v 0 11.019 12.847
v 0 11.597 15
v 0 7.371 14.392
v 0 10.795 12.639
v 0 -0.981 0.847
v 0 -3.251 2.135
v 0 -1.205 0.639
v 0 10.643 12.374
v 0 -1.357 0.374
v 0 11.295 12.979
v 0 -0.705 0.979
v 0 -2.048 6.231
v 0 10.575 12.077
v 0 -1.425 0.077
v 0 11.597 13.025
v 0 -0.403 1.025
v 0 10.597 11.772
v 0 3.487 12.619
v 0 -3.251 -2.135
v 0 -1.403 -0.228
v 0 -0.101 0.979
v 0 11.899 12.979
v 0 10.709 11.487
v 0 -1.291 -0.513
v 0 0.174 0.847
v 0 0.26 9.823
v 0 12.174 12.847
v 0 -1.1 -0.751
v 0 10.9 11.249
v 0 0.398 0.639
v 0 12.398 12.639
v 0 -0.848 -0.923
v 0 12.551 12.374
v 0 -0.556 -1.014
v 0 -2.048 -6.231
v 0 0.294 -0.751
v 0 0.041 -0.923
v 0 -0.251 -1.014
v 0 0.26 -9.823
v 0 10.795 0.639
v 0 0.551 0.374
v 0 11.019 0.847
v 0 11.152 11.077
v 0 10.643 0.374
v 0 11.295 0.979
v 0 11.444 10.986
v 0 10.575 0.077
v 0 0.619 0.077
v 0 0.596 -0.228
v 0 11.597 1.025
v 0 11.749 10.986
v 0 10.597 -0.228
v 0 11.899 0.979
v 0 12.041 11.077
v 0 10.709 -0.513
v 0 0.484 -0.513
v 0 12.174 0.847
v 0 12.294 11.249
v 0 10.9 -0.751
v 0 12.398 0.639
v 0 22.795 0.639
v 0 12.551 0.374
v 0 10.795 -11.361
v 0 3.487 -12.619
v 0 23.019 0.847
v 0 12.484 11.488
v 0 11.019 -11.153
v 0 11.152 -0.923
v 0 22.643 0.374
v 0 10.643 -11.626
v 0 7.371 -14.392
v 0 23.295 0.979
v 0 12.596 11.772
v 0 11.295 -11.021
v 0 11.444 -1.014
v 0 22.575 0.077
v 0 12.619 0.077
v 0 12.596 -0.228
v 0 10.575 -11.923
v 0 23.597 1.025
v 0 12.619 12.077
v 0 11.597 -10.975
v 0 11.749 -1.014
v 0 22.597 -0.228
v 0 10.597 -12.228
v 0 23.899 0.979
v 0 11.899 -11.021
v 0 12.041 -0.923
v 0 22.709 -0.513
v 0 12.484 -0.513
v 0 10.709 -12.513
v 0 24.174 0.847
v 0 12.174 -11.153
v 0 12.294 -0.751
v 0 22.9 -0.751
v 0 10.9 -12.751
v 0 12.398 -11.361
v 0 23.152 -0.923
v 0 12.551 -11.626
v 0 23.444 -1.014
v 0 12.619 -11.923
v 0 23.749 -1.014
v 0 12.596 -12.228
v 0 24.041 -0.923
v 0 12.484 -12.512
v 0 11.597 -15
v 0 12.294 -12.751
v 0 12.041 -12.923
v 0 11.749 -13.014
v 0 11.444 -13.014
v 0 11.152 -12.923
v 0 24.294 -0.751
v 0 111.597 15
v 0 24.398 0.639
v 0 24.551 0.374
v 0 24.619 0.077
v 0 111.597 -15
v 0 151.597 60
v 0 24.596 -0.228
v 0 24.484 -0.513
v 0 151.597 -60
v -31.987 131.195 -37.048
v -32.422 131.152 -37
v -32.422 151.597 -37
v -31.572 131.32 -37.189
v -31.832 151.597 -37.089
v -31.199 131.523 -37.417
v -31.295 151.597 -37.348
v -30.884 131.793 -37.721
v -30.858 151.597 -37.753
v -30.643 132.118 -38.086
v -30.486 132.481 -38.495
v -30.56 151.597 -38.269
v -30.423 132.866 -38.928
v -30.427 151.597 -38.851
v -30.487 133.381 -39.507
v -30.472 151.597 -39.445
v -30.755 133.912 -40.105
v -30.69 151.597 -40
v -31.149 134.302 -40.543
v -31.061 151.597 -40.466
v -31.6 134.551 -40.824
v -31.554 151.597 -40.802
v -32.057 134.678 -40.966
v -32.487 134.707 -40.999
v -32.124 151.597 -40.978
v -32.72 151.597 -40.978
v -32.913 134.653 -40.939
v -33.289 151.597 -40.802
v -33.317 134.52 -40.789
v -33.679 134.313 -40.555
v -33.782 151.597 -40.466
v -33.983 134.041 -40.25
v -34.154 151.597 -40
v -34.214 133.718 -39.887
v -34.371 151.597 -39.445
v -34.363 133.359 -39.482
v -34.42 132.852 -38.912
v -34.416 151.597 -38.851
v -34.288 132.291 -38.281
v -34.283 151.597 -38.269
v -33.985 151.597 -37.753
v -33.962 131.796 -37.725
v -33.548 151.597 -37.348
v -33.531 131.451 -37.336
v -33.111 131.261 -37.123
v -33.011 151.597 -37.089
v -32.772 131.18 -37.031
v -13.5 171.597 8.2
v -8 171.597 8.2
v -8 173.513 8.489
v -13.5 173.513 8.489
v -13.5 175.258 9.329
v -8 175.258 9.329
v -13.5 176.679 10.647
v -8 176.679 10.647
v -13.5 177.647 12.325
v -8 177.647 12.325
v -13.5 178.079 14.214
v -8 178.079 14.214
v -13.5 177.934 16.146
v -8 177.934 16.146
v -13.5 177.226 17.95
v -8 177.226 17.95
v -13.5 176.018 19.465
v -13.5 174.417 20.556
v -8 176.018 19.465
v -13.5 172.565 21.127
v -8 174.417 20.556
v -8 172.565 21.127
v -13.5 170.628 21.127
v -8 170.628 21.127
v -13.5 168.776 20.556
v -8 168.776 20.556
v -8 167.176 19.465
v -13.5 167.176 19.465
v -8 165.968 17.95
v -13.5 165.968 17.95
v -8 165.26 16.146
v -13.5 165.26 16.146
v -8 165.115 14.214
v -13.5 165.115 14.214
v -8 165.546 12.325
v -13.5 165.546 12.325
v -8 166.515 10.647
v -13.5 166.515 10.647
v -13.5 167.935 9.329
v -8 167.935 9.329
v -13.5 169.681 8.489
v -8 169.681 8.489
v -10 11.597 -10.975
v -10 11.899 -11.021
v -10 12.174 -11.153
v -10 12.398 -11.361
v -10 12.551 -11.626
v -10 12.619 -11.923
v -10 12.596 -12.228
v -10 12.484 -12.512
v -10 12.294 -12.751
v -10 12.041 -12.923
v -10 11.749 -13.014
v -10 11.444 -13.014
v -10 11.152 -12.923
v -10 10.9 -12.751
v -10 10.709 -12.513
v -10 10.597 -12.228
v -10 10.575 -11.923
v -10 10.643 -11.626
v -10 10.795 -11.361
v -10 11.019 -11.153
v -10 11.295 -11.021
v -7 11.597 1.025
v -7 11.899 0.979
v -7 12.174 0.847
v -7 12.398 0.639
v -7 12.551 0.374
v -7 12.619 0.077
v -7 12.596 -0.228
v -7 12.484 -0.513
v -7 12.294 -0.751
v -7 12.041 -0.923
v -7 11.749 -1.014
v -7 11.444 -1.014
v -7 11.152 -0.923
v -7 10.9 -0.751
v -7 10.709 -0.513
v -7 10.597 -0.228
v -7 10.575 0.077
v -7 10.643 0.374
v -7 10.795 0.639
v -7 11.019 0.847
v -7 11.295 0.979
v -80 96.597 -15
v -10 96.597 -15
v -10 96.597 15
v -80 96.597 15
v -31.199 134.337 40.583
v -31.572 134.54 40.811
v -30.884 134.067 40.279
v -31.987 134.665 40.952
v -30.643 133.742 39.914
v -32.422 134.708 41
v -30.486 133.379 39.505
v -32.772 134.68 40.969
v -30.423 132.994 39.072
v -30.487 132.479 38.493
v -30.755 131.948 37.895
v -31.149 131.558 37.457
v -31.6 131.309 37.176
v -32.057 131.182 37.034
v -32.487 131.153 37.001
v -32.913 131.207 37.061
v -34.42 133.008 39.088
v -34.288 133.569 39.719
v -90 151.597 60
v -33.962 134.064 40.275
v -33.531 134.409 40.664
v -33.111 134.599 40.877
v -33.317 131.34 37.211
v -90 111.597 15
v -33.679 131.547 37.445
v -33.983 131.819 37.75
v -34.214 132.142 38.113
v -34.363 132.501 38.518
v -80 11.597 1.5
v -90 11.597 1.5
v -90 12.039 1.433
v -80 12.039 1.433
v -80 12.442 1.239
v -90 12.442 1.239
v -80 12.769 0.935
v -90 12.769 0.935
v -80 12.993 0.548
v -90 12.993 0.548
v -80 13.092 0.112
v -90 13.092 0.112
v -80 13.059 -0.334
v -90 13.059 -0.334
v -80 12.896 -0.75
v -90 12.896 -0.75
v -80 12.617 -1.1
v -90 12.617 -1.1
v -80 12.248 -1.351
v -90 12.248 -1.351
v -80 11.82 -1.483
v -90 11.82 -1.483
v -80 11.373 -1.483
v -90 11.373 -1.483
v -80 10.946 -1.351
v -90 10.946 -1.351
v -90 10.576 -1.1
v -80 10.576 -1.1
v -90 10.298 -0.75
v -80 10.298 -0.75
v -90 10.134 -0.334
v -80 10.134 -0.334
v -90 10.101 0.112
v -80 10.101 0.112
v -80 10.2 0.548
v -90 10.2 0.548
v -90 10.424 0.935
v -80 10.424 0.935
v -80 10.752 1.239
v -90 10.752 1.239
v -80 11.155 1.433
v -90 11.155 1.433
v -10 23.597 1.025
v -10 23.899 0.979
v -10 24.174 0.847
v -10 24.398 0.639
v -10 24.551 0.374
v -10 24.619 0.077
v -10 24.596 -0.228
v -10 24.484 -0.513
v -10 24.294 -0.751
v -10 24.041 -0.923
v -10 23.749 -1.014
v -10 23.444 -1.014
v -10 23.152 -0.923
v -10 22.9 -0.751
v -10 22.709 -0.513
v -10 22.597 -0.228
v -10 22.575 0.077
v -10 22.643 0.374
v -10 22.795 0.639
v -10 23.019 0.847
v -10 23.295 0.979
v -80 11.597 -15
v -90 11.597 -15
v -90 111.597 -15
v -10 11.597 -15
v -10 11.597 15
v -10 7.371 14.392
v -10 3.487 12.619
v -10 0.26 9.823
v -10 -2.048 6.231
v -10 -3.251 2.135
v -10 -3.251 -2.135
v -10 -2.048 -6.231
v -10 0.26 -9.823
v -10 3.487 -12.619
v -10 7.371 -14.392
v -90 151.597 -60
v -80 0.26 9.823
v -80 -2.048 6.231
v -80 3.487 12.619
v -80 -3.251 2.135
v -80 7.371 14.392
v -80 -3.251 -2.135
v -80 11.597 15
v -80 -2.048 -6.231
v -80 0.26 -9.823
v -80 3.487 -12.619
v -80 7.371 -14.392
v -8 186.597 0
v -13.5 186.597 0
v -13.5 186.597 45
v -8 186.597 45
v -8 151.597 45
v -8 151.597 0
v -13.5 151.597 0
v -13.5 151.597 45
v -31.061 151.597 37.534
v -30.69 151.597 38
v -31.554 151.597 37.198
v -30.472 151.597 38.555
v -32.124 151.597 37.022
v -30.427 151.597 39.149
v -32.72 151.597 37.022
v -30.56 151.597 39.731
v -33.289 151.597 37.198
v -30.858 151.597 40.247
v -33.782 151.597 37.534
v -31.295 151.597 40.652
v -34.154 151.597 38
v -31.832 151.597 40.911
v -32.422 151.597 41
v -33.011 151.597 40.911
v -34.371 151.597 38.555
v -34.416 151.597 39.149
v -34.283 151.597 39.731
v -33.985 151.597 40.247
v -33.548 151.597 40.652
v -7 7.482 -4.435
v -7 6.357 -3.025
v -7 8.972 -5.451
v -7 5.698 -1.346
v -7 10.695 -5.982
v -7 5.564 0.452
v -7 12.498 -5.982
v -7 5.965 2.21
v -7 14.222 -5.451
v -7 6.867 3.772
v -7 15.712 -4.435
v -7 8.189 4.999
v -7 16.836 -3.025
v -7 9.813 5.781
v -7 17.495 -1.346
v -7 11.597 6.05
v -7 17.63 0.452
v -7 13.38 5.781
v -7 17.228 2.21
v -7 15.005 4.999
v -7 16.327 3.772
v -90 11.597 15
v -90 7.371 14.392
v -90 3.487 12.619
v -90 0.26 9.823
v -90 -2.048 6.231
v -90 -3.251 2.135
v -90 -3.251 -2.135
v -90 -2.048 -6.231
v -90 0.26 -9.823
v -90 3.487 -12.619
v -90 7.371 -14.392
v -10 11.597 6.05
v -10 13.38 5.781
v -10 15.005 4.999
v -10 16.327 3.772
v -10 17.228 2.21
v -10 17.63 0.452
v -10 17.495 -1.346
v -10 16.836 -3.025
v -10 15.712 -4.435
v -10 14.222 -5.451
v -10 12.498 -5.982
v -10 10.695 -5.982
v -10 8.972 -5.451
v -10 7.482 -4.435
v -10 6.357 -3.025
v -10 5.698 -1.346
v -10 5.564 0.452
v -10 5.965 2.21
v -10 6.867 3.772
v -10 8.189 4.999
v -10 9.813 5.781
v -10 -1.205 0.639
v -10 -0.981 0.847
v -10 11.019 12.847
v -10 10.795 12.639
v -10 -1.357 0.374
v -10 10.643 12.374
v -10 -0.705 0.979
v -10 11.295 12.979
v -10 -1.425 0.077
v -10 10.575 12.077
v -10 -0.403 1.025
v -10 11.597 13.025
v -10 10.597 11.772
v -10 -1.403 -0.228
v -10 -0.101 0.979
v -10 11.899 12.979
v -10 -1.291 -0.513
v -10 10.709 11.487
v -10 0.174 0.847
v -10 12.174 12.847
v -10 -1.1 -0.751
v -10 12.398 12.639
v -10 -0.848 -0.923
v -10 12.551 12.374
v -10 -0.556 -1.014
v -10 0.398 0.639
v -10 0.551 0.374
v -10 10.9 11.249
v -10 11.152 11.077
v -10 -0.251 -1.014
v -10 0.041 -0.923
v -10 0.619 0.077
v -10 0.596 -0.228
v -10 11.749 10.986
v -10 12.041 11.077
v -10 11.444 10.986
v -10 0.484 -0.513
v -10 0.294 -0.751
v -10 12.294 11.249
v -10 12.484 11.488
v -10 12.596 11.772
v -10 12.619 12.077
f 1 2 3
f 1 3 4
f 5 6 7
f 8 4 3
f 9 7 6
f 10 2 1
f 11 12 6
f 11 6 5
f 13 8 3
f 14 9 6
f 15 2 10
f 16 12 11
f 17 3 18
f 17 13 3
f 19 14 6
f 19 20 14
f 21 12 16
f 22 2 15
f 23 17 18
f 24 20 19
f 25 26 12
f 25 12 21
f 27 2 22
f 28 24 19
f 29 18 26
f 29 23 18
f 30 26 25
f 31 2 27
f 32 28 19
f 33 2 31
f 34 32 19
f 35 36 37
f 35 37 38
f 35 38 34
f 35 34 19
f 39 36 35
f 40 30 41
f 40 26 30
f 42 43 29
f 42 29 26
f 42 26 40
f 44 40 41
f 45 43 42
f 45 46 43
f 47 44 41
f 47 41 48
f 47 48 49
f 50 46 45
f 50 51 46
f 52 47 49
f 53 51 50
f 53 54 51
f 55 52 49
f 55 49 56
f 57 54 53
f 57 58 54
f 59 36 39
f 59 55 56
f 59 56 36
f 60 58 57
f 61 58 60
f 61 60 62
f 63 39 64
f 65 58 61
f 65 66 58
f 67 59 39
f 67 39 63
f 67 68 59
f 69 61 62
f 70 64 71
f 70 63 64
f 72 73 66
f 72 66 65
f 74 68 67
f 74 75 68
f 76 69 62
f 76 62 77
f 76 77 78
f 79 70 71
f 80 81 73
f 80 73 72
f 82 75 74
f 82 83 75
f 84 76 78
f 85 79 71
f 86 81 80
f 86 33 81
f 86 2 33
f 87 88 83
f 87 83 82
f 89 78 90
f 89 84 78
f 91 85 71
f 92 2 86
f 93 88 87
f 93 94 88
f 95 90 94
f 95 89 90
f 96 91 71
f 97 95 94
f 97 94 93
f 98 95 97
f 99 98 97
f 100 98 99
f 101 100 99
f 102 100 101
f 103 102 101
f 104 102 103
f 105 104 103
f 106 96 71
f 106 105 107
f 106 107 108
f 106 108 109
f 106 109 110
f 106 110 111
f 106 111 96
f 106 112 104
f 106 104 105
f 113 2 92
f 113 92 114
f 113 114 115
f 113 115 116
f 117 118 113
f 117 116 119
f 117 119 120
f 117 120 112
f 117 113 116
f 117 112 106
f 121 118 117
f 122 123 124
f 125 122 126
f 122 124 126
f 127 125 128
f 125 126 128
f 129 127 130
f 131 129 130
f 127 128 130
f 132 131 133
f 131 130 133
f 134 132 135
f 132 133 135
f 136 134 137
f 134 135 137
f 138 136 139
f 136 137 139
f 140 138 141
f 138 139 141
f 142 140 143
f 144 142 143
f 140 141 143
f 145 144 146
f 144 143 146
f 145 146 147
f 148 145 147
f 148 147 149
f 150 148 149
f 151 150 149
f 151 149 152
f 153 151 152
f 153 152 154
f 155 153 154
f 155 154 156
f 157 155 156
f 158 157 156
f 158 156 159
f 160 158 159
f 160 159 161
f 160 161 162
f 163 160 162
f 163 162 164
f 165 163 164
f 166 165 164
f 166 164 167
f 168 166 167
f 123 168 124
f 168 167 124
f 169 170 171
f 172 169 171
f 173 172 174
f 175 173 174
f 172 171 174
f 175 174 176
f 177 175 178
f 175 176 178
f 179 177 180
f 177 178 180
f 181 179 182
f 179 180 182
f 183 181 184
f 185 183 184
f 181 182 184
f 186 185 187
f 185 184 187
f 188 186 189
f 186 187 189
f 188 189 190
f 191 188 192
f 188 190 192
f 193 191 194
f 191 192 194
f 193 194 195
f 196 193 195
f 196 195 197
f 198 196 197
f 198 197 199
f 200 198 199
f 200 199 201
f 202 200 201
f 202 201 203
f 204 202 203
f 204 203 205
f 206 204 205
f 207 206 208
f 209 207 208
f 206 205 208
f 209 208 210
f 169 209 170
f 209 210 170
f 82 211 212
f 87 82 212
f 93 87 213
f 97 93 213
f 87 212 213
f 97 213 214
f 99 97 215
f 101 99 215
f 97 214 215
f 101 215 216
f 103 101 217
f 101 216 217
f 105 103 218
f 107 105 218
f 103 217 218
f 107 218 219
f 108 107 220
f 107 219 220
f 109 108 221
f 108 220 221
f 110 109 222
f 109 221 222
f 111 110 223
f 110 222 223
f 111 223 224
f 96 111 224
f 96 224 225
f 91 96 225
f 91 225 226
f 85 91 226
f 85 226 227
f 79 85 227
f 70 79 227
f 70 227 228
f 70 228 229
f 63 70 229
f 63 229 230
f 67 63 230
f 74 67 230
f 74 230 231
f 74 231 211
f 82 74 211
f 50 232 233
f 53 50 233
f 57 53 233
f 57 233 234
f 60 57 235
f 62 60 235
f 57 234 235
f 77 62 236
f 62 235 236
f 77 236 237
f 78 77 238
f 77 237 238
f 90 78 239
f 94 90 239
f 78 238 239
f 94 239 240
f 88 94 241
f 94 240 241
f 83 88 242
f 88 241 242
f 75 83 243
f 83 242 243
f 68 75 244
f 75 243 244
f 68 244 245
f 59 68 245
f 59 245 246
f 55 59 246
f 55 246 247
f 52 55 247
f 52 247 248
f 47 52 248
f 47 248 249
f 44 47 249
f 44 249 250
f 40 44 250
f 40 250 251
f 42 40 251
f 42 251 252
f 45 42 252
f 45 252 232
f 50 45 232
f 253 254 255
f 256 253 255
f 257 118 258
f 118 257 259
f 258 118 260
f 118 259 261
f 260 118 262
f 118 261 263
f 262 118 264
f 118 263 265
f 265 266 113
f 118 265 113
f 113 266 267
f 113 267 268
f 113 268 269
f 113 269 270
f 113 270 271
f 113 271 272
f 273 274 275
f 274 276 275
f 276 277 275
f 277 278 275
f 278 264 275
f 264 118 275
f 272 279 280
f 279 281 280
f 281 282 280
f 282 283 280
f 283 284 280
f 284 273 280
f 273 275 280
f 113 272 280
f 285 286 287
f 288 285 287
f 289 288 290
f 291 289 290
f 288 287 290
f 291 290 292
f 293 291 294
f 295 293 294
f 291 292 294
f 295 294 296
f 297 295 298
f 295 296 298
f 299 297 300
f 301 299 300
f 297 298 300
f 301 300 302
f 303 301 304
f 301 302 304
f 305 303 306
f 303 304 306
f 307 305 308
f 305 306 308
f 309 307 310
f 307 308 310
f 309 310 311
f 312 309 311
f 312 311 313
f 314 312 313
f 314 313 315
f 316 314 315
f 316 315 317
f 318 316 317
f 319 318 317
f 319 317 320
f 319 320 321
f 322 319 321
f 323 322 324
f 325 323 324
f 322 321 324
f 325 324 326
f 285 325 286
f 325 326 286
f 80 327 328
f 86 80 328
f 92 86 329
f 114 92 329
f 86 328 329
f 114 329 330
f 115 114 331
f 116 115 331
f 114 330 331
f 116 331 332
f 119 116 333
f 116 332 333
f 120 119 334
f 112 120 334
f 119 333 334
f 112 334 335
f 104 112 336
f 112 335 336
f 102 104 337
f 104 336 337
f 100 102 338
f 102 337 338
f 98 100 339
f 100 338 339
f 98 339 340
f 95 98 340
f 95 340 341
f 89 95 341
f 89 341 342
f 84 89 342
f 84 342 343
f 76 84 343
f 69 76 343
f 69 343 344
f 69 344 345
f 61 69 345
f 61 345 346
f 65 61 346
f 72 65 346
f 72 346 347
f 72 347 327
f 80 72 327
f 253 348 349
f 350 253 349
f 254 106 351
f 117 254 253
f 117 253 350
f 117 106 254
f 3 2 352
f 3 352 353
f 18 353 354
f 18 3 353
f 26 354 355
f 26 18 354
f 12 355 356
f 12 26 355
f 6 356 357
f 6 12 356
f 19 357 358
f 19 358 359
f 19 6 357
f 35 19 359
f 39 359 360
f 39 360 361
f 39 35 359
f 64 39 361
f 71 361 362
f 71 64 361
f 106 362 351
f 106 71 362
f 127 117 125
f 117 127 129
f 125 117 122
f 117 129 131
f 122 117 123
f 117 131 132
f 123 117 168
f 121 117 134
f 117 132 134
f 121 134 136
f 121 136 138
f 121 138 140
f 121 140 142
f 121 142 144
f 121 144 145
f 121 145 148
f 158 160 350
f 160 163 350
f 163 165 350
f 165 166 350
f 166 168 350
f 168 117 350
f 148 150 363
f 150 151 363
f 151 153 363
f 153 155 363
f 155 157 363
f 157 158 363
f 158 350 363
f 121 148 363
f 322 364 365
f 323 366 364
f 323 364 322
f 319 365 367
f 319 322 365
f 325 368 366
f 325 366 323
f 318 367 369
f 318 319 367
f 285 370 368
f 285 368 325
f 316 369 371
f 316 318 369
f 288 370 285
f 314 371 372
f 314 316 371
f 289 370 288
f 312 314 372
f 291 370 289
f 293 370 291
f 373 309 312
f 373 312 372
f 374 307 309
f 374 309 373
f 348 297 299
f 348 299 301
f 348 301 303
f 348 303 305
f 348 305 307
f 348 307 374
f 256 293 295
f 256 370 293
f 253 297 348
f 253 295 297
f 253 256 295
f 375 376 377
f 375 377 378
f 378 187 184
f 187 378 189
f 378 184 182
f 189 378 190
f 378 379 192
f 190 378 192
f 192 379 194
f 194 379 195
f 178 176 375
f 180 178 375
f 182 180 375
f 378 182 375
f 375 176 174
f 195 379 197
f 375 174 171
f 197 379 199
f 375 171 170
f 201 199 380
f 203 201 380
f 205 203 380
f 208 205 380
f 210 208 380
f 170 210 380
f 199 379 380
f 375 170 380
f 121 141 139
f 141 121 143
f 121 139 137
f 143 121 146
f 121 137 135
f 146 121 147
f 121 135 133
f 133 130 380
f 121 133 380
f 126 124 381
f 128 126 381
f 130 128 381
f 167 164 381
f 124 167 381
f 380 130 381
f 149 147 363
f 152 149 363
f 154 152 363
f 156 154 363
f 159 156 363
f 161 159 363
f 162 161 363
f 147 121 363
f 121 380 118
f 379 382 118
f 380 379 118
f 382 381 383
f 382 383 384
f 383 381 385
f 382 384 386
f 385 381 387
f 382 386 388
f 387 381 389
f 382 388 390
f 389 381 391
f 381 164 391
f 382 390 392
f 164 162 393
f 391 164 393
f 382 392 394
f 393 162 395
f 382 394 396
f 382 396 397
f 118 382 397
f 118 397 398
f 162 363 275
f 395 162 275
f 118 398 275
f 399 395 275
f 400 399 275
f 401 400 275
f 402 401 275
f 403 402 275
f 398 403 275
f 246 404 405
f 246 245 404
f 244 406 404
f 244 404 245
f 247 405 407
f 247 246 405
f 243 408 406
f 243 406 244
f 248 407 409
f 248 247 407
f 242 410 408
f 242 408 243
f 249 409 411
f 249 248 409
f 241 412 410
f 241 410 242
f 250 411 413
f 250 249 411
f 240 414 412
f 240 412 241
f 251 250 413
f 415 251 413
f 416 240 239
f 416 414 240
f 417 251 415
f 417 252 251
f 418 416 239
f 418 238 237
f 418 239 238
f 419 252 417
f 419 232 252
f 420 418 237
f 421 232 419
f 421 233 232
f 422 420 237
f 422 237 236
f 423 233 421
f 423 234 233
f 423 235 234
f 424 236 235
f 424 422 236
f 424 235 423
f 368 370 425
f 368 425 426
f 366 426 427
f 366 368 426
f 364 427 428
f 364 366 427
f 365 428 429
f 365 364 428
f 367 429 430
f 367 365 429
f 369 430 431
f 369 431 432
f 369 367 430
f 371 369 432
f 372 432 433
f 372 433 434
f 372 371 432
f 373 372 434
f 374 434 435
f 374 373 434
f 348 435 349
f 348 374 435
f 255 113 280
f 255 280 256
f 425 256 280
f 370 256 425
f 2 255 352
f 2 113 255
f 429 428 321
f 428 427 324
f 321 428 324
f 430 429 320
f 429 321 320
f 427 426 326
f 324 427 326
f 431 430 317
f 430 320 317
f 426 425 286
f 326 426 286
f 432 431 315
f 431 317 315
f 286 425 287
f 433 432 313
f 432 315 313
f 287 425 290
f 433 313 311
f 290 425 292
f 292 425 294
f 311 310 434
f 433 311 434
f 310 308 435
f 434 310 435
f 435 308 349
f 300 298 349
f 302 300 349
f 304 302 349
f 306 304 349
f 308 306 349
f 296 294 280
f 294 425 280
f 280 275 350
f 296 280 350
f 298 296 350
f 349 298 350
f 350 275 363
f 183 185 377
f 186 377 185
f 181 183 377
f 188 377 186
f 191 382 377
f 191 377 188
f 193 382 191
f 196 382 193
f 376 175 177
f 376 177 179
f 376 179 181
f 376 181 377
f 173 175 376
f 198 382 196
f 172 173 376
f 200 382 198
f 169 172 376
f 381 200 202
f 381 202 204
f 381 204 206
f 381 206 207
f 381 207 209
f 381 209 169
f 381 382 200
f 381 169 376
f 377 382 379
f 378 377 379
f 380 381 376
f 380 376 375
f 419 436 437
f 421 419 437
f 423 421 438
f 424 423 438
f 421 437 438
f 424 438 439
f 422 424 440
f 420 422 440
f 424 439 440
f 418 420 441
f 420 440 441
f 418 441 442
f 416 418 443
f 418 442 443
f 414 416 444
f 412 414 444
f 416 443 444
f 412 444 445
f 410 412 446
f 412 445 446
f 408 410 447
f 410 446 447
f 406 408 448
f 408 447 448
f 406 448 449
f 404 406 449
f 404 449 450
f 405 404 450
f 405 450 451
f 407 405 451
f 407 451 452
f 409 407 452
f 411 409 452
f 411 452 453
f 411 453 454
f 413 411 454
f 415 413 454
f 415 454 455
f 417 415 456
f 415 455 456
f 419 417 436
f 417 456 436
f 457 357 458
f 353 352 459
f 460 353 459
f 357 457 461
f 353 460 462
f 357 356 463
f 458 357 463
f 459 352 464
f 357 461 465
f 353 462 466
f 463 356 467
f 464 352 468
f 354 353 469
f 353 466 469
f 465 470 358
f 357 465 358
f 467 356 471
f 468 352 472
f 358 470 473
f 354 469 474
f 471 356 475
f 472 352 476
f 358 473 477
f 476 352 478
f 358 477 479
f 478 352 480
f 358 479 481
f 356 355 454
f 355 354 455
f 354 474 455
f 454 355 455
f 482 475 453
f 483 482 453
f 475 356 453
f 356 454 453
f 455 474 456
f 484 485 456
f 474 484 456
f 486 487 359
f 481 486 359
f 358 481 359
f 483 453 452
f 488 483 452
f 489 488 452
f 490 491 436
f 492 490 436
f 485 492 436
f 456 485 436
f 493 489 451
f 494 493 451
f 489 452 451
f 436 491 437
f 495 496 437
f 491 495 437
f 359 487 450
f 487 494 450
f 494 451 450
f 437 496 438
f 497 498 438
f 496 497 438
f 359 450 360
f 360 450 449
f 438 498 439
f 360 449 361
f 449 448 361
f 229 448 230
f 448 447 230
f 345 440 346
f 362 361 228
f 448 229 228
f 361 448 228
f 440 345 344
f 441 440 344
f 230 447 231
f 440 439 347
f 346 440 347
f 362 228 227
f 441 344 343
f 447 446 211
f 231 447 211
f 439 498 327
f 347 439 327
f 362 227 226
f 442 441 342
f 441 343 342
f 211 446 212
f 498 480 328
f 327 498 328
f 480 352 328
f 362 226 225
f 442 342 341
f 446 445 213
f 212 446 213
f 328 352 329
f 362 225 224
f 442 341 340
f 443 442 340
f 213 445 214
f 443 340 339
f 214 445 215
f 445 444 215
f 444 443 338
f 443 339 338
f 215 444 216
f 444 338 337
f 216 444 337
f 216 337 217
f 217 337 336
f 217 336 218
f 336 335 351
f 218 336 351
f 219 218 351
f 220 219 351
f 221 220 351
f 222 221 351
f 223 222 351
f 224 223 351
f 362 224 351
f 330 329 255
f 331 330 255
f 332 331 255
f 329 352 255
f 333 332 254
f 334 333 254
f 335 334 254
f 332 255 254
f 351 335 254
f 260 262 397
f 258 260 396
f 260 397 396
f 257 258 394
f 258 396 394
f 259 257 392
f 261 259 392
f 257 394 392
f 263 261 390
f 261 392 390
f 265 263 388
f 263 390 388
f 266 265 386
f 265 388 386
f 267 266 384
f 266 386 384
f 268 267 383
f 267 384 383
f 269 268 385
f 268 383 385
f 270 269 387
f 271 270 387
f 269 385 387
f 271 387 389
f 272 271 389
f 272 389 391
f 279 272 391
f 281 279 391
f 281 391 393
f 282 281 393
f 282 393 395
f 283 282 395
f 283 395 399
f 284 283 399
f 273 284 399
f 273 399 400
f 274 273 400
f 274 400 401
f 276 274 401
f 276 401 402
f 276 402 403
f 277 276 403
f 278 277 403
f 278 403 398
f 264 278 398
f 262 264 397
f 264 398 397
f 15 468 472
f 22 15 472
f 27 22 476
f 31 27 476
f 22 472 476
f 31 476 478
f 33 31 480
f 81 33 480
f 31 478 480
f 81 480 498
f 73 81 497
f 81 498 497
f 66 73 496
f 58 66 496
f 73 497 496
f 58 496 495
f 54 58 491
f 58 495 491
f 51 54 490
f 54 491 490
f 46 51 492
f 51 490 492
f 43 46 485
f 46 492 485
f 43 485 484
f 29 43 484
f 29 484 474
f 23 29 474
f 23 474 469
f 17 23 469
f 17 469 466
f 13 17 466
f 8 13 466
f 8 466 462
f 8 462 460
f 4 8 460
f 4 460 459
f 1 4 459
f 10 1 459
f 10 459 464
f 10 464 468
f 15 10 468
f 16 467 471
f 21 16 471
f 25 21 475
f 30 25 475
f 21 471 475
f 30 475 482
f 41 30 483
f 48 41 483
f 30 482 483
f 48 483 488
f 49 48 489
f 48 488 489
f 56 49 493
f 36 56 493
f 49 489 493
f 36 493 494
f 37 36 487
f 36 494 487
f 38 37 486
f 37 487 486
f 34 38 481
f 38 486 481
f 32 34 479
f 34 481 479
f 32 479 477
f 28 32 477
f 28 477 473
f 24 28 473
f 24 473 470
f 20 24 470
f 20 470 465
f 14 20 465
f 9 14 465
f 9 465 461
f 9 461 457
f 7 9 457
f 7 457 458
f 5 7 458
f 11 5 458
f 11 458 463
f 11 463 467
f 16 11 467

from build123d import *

# Parameters (mm, degrees)
BOSS_EXTRUDE1_DEPTH = 10
SKETCH4_W           = 30
SKETCH4_H           = 15
BOSS_EXTRUDE2_DEPTH = 70
BOSS_EXTRUDE3_DEPTH = 10
SKETCH6_R           = 6.05
CUT_EXTRUDE3_DEPTH  = 3
SKETCH7_R           = 1.025
CUT_EXTRUDE4_DEPTH  = 139.126108227
SKETCH10_R          = 1.5
CUT_EXTRUDE9_DEPTH  = 10
BOSS_EXTRUDE4_DEPTH = 90
SKETCH15_W          = 5.5
SKETCH15_H          = 45
BOSS_EXTRUDE5_DEPTH = 35
SKETCH16_R          = 6.5
CUT_EXTRUDE10_DEPTH = 5.5
SKETCH17_R          = 2
CUT_EXTRUDE11_DEPTH = 34


with BuildPart() as part:
    # Sketch1 → Boss-Extrude1 (new body)
    with BuildSketch(Plane(origin=(0, 0, 0), x_dir=(0, 0, -1), z_dir=(1, 0, 0))):
        with BuildLine():
            Line((15, 11.596692486), (15, 111.596692486))
            Line((15, 111.596692486), (-15, 111.596692486))
            Line((-15, 111.596692486), (-15, 11.596692486))
            ThreePointArc((-15, 11.596692486), (0, -3.403307514), (15, 11.596692486))
        make_face()
    extrude(amount=-BOSS_EXTRUDE1_DEPTH)

    # Sketch4 → Boss-Extrude2 (add)
    with BuildSketch(Plane.ZY.offset(10)):
        with Locations((0, 104.096692486)):
            Rectangle(SKETCH4_W, SKETCH4_H)
    extrude(amount=BOSS_EXTRUDE2_DEPTH)

    # Sketch5 → Boss-Extrude3 (add)
    with BuildSketch(Plane.ZY.offset(80)):
        with BuildLine():
            Line((-15, 111.596692486), (15, 111.596692486))
            Line((15, 111.596692486), (15, 11.596692486))
            ThreePointArc((15, 11.596692486), (0, -3.403307514), (-15, 11.596692486))
            Line((-15, 11.596692486), (-15, 111.596692486))
        make_face()
    extrude(amount=BOSS_EXTRUDE3_DEPTH)

    # Sketch6 → Cut-Extrude3 (cut)
    with BuildSketch(Plane.ZY.offset(10)):
        with Locations((0, 11.596692486)):
            Circle(SKETCH6_R)
    extrude(amount=-CUT_EXTRUDE3_DEPTH, mode=Mode.SUBTRACT)

    # Sketch7 → Cut-Extrude4 (cut, through all)
    with BuildSketch(Plane.ZY.offset(10)):
        with Locations((0, 23.596692486)):
            Circle(SKETCH7_R)
        with Locations((12, 11.596692486)):
            Circle(SKETCH7_R)
        with Locations((0, -0.403307514)):
            Circle(SKETCH7_R)
        with Locations((-12, 11.596692486)):
            Circle(SKETCH7_R)
        with Locations((0, 11.596692486)):
            Circle(SKETCH7_R)
    extrude(amount=-CUT_EXTRUDE4_DEPTH, mode=Mode.SUBTRACT)

    # Sketch10 → Cut-Extrude9 (cut)
    with BuildSketch(Plane.ZY.offset(90)):
        with Locations((0, 11.596692486)):
            Circle(SKETCH10_R)
    extrude(amount=-CUT_EXTRUDE9_DEPTH, mode=Mode.SUBTRACT)

    # Sketch14 → Boss-Extrude4 (add)
    with BuildSketch(Plane.ZY.offset(90)):
        Polygon((-15, 111.596692486), (-60, 151.596692486), (60, 151.596692486), (15, 111.596692486), align=None)
    extrude(amount=-BOSS_EXTRUDE4_DEPTH)

    # Sketch15 → Boss-Extrude5 (add)
    with BuildSketch(Plane(origin=(0, 151.596692486, 0), x_dir=(1, 0, 0), z_dir=(0, 1, 0))):
        with Locations((-10.75, -22.5)):
            Rectangle(SKETCH15_W, SKETCH15_H)
    extrude(amount=BOSS_EXTRUDE5_DEPTH)

    # Sketch16 → Cut-Extrude10 (cut)
    with BuildSketch(Plane(origin=(-8, 0, 0), x_dir=(0, 0, -1), z_dir=(1, 0, 0))):
        with Locations((-14.7, 171.596692486)):
            Circle(SKETCH16_R)
    extrude(amount=-CUT_EXTRUDE10_DEPTH, mode=Mode.SUBTRACT)

    # Sketch17 → Cut-Extrude11 (cut)
    with BuildSketch(Plane(origin=(0, 151.596692486, 0), x_dir=(1, 0, 0), z_dir=(0, 1, 0))):
        with Locations(Location((-32.421605661, 39, 0), (0, 0, 270))):
            Circle(SKETCH17_R)
        with Locations(Location((-32.421605661, -39, 0), (0, 0, 270))):
            Circle(SKETCH17_R)
    extrude(amount=-CUT_EXTRUDE11_DEPTH, mode=Mode.SUBTRACT)


solid = part.part
